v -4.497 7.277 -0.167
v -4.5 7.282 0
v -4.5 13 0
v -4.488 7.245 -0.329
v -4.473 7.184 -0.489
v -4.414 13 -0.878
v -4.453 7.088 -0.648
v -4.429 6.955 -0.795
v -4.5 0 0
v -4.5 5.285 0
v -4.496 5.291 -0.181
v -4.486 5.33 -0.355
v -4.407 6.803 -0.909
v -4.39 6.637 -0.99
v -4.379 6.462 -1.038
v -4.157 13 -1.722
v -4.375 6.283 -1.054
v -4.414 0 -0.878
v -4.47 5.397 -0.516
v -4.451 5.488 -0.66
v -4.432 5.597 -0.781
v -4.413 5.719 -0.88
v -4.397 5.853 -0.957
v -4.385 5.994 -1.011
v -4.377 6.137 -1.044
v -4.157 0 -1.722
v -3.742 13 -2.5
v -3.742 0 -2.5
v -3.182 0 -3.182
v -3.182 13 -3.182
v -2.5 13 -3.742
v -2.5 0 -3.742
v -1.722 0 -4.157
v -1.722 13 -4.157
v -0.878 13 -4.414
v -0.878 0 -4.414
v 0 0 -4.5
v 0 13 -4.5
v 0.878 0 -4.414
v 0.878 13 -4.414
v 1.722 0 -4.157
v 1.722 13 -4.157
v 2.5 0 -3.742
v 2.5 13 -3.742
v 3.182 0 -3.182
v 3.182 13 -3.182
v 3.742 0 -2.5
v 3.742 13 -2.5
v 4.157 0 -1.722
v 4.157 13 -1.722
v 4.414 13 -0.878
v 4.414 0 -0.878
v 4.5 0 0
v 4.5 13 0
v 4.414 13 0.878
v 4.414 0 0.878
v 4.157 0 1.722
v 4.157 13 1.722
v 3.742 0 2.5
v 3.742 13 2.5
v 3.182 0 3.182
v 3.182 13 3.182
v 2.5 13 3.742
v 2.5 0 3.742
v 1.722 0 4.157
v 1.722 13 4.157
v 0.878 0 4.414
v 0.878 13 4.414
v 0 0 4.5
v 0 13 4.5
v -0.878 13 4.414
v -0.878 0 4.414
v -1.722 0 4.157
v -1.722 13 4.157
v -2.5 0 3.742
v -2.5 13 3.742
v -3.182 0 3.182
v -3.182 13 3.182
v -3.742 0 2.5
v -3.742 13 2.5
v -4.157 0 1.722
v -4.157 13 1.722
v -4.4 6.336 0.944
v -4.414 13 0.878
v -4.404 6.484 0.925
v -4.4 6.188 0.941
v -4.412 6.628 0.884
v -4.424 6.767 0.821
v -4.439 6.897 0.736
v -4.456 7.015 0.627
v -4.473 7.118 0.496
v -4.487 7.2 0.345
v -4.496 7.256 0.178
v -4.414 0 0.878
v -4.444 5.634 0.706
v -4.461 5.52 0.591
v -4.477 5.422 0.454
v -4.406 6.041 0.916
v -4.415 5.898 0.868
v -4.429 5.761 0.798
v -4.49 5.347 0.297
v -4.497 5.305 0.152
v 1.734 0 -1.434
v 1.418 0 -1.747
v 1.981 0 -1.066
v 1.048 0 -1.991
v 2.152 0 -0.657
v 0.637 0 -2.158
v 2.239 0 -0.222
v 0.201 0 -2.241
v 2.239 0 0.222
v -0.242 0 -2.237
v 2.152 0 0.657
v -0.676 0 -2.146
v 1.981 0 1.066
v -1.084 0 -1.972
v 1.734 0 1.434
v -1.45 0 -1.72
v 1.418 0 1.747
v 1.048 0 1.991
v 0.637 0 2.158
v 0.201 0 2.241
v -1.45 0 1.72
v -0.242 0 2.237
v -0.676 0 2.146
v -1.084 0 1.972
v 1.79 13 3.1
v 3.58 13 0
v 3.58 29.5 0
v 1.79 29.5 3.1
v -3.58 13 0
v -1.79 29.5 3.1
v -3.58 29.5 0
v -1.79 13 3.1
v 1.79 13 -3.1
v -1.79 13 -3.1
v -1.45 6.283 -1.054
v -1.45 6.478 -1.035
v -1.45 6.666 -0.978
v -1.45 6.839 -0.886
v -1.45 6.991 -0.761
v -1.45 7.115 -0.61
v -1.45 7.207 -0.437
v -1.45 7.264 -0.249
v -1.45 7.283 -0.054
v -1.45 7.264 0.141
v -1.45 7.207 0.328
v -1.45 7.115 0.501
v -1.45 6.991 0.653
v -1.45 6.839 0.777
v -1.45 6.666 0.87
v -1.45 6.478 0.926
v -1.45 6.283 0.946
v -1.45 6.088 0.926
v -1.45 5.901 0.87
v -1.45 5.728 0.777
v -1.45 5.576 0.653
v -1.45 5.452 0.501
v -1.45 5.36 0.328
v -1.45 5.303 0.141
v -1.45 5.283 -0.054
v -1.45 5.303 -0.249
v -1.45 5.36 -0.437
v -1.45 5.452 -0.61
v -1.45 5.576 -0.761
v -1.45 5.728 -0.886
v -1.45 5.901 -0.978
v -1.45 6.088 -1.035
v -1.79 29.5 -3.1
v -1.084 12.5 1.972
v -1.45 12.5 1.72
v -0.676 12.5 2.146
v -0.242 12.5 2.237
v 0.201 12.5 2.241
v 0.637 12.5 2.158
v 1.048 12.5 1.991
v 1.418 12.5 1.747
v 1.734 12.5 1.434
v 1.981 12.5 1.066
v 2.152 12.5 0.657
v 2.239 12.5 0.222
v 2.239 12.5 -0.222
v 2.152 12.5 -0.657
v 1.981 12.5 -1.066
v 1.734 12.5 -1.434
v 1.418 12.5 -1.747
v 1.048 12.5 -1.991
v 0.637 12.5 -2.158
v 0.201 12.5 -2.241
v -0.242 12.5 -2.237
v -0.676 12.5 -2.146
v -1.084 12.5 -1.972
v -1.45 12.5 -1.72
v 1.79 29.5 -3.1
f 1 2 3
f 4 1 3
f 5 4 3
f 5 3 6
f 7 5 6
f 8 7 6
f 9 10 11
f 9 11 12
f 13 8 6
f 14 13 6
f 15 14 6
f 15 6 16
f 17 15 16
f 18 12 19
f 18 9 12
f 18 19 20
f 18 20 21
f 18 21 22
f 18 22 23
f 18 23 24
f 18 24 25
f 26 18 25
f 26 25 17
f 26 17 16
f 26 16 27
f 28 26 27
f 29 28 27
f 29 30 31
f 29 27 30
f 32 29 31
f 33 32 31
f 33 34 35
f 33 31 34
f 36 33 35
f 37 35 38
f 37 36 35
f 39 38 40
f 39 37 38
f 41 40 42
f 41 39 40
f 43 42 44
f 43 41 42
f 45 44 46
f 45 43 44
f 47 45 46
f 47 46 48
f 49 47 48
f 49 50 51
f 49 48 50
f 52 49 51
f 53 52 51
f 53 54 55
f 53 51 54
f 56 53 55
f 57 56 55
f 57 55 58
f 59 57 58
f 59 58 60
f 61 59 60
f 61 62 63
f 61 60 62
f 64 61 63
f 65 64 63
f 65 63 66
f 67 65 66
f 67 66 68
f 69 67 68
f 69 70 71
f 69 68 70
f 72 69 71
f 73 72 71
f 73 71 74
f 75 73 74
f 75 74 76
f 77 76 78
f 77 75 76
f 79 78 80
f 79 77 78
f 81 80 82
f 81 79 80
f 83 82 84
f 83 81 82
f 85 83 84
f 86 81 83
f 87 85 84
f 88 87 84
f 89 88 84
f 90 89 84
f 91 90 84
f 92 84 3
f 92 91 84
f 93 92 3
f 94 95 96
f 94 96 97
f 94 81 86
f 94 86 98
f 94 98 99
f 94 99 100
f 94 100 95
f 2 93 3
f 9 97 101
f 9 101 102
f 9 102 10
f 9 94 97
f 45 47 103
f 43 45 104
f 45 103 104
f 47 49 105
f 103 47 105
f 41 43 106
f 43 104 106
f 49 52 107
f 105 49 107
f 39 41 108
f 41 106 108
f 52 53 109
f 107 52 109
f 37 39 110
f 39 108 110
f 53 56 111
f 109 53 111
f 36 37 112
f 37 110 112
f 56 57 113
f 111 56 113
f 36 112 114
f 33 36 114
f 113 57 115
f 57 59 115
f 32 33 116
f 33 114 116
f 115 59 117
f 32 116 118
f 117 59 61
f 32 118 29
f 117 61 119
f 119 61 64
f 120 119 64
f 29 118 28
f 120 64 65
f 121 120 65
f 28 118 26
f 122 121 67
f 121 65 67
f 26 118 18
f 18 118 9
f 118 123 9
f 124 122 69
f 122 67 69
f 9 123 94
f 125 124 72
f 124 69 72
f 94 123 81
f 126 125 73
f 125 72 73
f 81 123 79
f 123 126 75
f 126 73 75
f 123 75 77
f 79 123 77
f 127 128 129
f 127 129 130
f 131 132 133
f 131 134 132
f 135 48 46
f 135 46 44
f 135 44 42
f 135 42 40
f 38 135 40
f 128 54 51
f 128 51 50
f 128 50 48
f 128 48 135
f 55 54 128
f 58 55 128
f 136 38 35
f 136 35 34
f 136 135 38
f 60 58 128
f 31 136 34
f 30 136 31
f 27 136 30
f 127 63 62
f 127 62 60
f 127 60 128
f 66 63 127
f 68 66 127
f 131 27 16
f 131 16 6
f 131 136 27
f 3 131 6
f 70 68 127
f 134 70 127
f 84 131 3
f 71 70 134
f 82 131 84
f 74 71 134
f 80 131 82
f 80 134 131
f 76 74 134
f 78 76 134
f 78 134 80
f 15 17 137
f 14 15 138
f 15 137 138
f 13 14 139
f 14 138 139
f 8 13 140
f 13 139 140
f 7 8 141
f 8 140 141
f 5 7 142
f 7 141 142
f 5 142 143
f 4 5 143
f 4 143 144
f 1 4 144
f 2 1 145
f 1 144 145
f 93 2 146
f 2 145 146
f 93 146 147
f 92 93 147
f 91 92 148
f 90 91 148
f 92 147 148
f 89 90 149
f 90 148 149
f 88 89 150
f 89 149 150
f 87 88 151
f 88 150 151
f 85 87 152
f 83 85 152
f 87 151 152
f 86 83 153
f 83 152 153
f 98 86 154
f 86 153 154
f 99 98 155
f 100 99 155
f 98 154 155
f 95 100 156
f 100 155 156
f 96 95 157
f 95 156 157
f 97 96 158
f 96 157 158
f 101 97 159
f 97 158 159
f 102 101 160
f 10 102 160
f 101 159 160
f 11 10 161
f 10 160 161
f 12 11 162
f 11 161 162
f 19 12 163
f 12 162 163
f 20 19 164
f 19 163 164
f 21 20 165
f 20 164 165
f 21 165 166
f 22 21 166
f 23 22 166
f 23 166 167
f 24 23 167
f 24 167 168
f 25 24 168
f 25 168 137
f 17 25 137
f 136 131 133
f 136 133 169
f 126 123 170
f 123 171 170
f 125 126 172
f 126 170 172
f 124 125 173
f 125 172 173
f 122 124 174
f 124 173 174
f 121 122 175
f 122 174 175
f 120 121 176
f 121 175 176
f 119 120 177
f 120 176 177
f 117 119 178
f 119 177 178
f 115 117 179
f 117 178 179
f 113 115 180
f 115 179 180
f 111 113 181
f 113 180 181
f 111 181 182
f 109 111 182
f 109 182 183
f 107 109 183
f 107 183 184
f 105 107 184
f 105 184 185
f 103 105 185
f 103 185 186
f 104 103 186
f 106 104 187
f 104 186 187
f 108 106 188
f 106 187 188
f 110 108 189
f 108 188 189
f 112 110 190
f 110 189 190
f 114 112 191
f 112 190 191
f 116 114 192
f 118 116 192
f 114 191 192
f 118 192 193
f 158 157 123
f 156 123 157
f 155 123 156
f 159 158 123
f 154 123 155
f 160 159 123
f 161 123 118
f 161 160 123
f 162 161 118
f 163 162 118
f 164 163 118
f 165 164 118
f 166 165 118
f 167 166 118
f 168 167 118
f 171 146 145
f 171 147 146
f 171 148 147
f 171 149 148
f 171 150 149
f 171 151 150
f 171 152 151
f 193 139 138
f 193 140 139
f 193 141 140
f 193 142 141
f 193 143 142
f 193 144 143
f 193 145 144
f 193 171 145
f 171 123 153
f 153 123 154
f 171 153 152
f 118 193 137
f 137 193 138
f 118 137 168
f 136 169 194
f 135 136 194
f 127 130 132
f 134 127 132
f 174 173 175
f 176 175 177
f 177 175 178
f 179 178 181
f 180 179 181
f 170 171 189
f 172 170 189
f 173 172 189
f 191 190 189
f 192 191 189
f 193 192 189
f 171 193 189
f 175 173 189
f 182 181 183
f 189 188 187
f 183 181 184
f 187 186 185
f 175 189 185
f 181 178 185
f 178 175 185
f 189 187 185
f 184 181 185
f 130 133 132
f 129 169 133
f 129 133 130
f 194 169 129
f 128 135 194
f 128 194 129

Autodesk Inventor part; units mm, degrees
ref_plane "YZ Plane" through (0, 0, 0) normal (1, 0, 0) x (0, 1, 0)
ref_plane "XZ Plane" through (0, 0, 0) normal (0, 1, 0) x (-1, 0, 0)
ref_plane "XY Plane" through (0, 0, 0) normal (0, 0, 1) x (1, 0, 0)
sketch "Sketch4" plane through (0, 0, 0) normal (0, 1, 0) x (-1, 0, 0)
  circle A0 centre (0, 0) radius 4.5
  dimension "d6" = 9
extrude "Extrusion2" add sketch "Sketch4" along normal blind 13
sketch "Sketch5" plane through (0, 13, 0) normal (0, 1, 0) x (1, 0, 0)
  circle A0 centre (0, 0) radius 2.25
  line L0 (-1.45, -1.7205) -> (-1.45, 1.7205)
  dimension "d9" = 4.5
  dimension "d10" = 3.7
extrude "Extrusion3" cut sketch "Sketch5" against normal blind 13 contours A0 L0 picked at (-0.101, 0.4724)
sketch "Sketch7" plane through (0, 13, 0) normal (0, 1, 0) x (1, 0, 0)
  line L0 (-3.58, 0) -> (-1.79, 3.1004)
  line L1 (-1.79, 3.1004) -> (1.79, 3.1004)
  line L2 (1.79, 3.1004) -> (3.58, 0)
  line L3 (3.58, 0) -> (1.79, -3.1004)
  line L4 (1.79, -3.1004) -> (-1.79, -3.1004)
  line L5 (-1.79, -3.1004) -> (-3.58, 0)
  point P0 (0, 0)
  point P1 (0, 0)
  dimension "d15" = 7.16
extrude "Extrusion5" add sketch "Sketch7" along normal blind 16.5 and the other way blind 0.5
sketch "Sketch15" plane through (-1.45, 0, 1.7205) normal (1, 0, 0) x (0, 0, -1)
  circle A0 centre (1.7748, 6.2834) radius 1
  point P0 (1.7205, 0)
  dimension "d41" = 2
extrude "Extrusion11" cut sketch "Sketch15" against normal blind 4.25
sketch "Sketch9" plane through (-1.45, 0, 1.3129) normal (1, 0, 0) x (0, 0, -1)
  circle A0 centre (1.3129, 5.7735) radius 1
  point P0 (1.3129, 0)
  dimension "d21" = 2
sketch "Sketch10" plane through (-3.75, 5.7735, 0) normal (-1, 0, 0) x (0, 0, 1)
  point P0 (0, -5.7735)
  point P1 (-0.001, 0.0019)
sketch "Sketch1" plane through (0, 0, 0) normal (0, 1, 0) x (-1, 0, 0)
  circle A0 centre (0, 0) radius 12.5
  dimension "d0" = 25
  dimension "d3" = 4
  dimension "d4" = 7
  dimension "d5" = 3.5
properties part number "As JGA To Mecanum 2_3DPrint"
